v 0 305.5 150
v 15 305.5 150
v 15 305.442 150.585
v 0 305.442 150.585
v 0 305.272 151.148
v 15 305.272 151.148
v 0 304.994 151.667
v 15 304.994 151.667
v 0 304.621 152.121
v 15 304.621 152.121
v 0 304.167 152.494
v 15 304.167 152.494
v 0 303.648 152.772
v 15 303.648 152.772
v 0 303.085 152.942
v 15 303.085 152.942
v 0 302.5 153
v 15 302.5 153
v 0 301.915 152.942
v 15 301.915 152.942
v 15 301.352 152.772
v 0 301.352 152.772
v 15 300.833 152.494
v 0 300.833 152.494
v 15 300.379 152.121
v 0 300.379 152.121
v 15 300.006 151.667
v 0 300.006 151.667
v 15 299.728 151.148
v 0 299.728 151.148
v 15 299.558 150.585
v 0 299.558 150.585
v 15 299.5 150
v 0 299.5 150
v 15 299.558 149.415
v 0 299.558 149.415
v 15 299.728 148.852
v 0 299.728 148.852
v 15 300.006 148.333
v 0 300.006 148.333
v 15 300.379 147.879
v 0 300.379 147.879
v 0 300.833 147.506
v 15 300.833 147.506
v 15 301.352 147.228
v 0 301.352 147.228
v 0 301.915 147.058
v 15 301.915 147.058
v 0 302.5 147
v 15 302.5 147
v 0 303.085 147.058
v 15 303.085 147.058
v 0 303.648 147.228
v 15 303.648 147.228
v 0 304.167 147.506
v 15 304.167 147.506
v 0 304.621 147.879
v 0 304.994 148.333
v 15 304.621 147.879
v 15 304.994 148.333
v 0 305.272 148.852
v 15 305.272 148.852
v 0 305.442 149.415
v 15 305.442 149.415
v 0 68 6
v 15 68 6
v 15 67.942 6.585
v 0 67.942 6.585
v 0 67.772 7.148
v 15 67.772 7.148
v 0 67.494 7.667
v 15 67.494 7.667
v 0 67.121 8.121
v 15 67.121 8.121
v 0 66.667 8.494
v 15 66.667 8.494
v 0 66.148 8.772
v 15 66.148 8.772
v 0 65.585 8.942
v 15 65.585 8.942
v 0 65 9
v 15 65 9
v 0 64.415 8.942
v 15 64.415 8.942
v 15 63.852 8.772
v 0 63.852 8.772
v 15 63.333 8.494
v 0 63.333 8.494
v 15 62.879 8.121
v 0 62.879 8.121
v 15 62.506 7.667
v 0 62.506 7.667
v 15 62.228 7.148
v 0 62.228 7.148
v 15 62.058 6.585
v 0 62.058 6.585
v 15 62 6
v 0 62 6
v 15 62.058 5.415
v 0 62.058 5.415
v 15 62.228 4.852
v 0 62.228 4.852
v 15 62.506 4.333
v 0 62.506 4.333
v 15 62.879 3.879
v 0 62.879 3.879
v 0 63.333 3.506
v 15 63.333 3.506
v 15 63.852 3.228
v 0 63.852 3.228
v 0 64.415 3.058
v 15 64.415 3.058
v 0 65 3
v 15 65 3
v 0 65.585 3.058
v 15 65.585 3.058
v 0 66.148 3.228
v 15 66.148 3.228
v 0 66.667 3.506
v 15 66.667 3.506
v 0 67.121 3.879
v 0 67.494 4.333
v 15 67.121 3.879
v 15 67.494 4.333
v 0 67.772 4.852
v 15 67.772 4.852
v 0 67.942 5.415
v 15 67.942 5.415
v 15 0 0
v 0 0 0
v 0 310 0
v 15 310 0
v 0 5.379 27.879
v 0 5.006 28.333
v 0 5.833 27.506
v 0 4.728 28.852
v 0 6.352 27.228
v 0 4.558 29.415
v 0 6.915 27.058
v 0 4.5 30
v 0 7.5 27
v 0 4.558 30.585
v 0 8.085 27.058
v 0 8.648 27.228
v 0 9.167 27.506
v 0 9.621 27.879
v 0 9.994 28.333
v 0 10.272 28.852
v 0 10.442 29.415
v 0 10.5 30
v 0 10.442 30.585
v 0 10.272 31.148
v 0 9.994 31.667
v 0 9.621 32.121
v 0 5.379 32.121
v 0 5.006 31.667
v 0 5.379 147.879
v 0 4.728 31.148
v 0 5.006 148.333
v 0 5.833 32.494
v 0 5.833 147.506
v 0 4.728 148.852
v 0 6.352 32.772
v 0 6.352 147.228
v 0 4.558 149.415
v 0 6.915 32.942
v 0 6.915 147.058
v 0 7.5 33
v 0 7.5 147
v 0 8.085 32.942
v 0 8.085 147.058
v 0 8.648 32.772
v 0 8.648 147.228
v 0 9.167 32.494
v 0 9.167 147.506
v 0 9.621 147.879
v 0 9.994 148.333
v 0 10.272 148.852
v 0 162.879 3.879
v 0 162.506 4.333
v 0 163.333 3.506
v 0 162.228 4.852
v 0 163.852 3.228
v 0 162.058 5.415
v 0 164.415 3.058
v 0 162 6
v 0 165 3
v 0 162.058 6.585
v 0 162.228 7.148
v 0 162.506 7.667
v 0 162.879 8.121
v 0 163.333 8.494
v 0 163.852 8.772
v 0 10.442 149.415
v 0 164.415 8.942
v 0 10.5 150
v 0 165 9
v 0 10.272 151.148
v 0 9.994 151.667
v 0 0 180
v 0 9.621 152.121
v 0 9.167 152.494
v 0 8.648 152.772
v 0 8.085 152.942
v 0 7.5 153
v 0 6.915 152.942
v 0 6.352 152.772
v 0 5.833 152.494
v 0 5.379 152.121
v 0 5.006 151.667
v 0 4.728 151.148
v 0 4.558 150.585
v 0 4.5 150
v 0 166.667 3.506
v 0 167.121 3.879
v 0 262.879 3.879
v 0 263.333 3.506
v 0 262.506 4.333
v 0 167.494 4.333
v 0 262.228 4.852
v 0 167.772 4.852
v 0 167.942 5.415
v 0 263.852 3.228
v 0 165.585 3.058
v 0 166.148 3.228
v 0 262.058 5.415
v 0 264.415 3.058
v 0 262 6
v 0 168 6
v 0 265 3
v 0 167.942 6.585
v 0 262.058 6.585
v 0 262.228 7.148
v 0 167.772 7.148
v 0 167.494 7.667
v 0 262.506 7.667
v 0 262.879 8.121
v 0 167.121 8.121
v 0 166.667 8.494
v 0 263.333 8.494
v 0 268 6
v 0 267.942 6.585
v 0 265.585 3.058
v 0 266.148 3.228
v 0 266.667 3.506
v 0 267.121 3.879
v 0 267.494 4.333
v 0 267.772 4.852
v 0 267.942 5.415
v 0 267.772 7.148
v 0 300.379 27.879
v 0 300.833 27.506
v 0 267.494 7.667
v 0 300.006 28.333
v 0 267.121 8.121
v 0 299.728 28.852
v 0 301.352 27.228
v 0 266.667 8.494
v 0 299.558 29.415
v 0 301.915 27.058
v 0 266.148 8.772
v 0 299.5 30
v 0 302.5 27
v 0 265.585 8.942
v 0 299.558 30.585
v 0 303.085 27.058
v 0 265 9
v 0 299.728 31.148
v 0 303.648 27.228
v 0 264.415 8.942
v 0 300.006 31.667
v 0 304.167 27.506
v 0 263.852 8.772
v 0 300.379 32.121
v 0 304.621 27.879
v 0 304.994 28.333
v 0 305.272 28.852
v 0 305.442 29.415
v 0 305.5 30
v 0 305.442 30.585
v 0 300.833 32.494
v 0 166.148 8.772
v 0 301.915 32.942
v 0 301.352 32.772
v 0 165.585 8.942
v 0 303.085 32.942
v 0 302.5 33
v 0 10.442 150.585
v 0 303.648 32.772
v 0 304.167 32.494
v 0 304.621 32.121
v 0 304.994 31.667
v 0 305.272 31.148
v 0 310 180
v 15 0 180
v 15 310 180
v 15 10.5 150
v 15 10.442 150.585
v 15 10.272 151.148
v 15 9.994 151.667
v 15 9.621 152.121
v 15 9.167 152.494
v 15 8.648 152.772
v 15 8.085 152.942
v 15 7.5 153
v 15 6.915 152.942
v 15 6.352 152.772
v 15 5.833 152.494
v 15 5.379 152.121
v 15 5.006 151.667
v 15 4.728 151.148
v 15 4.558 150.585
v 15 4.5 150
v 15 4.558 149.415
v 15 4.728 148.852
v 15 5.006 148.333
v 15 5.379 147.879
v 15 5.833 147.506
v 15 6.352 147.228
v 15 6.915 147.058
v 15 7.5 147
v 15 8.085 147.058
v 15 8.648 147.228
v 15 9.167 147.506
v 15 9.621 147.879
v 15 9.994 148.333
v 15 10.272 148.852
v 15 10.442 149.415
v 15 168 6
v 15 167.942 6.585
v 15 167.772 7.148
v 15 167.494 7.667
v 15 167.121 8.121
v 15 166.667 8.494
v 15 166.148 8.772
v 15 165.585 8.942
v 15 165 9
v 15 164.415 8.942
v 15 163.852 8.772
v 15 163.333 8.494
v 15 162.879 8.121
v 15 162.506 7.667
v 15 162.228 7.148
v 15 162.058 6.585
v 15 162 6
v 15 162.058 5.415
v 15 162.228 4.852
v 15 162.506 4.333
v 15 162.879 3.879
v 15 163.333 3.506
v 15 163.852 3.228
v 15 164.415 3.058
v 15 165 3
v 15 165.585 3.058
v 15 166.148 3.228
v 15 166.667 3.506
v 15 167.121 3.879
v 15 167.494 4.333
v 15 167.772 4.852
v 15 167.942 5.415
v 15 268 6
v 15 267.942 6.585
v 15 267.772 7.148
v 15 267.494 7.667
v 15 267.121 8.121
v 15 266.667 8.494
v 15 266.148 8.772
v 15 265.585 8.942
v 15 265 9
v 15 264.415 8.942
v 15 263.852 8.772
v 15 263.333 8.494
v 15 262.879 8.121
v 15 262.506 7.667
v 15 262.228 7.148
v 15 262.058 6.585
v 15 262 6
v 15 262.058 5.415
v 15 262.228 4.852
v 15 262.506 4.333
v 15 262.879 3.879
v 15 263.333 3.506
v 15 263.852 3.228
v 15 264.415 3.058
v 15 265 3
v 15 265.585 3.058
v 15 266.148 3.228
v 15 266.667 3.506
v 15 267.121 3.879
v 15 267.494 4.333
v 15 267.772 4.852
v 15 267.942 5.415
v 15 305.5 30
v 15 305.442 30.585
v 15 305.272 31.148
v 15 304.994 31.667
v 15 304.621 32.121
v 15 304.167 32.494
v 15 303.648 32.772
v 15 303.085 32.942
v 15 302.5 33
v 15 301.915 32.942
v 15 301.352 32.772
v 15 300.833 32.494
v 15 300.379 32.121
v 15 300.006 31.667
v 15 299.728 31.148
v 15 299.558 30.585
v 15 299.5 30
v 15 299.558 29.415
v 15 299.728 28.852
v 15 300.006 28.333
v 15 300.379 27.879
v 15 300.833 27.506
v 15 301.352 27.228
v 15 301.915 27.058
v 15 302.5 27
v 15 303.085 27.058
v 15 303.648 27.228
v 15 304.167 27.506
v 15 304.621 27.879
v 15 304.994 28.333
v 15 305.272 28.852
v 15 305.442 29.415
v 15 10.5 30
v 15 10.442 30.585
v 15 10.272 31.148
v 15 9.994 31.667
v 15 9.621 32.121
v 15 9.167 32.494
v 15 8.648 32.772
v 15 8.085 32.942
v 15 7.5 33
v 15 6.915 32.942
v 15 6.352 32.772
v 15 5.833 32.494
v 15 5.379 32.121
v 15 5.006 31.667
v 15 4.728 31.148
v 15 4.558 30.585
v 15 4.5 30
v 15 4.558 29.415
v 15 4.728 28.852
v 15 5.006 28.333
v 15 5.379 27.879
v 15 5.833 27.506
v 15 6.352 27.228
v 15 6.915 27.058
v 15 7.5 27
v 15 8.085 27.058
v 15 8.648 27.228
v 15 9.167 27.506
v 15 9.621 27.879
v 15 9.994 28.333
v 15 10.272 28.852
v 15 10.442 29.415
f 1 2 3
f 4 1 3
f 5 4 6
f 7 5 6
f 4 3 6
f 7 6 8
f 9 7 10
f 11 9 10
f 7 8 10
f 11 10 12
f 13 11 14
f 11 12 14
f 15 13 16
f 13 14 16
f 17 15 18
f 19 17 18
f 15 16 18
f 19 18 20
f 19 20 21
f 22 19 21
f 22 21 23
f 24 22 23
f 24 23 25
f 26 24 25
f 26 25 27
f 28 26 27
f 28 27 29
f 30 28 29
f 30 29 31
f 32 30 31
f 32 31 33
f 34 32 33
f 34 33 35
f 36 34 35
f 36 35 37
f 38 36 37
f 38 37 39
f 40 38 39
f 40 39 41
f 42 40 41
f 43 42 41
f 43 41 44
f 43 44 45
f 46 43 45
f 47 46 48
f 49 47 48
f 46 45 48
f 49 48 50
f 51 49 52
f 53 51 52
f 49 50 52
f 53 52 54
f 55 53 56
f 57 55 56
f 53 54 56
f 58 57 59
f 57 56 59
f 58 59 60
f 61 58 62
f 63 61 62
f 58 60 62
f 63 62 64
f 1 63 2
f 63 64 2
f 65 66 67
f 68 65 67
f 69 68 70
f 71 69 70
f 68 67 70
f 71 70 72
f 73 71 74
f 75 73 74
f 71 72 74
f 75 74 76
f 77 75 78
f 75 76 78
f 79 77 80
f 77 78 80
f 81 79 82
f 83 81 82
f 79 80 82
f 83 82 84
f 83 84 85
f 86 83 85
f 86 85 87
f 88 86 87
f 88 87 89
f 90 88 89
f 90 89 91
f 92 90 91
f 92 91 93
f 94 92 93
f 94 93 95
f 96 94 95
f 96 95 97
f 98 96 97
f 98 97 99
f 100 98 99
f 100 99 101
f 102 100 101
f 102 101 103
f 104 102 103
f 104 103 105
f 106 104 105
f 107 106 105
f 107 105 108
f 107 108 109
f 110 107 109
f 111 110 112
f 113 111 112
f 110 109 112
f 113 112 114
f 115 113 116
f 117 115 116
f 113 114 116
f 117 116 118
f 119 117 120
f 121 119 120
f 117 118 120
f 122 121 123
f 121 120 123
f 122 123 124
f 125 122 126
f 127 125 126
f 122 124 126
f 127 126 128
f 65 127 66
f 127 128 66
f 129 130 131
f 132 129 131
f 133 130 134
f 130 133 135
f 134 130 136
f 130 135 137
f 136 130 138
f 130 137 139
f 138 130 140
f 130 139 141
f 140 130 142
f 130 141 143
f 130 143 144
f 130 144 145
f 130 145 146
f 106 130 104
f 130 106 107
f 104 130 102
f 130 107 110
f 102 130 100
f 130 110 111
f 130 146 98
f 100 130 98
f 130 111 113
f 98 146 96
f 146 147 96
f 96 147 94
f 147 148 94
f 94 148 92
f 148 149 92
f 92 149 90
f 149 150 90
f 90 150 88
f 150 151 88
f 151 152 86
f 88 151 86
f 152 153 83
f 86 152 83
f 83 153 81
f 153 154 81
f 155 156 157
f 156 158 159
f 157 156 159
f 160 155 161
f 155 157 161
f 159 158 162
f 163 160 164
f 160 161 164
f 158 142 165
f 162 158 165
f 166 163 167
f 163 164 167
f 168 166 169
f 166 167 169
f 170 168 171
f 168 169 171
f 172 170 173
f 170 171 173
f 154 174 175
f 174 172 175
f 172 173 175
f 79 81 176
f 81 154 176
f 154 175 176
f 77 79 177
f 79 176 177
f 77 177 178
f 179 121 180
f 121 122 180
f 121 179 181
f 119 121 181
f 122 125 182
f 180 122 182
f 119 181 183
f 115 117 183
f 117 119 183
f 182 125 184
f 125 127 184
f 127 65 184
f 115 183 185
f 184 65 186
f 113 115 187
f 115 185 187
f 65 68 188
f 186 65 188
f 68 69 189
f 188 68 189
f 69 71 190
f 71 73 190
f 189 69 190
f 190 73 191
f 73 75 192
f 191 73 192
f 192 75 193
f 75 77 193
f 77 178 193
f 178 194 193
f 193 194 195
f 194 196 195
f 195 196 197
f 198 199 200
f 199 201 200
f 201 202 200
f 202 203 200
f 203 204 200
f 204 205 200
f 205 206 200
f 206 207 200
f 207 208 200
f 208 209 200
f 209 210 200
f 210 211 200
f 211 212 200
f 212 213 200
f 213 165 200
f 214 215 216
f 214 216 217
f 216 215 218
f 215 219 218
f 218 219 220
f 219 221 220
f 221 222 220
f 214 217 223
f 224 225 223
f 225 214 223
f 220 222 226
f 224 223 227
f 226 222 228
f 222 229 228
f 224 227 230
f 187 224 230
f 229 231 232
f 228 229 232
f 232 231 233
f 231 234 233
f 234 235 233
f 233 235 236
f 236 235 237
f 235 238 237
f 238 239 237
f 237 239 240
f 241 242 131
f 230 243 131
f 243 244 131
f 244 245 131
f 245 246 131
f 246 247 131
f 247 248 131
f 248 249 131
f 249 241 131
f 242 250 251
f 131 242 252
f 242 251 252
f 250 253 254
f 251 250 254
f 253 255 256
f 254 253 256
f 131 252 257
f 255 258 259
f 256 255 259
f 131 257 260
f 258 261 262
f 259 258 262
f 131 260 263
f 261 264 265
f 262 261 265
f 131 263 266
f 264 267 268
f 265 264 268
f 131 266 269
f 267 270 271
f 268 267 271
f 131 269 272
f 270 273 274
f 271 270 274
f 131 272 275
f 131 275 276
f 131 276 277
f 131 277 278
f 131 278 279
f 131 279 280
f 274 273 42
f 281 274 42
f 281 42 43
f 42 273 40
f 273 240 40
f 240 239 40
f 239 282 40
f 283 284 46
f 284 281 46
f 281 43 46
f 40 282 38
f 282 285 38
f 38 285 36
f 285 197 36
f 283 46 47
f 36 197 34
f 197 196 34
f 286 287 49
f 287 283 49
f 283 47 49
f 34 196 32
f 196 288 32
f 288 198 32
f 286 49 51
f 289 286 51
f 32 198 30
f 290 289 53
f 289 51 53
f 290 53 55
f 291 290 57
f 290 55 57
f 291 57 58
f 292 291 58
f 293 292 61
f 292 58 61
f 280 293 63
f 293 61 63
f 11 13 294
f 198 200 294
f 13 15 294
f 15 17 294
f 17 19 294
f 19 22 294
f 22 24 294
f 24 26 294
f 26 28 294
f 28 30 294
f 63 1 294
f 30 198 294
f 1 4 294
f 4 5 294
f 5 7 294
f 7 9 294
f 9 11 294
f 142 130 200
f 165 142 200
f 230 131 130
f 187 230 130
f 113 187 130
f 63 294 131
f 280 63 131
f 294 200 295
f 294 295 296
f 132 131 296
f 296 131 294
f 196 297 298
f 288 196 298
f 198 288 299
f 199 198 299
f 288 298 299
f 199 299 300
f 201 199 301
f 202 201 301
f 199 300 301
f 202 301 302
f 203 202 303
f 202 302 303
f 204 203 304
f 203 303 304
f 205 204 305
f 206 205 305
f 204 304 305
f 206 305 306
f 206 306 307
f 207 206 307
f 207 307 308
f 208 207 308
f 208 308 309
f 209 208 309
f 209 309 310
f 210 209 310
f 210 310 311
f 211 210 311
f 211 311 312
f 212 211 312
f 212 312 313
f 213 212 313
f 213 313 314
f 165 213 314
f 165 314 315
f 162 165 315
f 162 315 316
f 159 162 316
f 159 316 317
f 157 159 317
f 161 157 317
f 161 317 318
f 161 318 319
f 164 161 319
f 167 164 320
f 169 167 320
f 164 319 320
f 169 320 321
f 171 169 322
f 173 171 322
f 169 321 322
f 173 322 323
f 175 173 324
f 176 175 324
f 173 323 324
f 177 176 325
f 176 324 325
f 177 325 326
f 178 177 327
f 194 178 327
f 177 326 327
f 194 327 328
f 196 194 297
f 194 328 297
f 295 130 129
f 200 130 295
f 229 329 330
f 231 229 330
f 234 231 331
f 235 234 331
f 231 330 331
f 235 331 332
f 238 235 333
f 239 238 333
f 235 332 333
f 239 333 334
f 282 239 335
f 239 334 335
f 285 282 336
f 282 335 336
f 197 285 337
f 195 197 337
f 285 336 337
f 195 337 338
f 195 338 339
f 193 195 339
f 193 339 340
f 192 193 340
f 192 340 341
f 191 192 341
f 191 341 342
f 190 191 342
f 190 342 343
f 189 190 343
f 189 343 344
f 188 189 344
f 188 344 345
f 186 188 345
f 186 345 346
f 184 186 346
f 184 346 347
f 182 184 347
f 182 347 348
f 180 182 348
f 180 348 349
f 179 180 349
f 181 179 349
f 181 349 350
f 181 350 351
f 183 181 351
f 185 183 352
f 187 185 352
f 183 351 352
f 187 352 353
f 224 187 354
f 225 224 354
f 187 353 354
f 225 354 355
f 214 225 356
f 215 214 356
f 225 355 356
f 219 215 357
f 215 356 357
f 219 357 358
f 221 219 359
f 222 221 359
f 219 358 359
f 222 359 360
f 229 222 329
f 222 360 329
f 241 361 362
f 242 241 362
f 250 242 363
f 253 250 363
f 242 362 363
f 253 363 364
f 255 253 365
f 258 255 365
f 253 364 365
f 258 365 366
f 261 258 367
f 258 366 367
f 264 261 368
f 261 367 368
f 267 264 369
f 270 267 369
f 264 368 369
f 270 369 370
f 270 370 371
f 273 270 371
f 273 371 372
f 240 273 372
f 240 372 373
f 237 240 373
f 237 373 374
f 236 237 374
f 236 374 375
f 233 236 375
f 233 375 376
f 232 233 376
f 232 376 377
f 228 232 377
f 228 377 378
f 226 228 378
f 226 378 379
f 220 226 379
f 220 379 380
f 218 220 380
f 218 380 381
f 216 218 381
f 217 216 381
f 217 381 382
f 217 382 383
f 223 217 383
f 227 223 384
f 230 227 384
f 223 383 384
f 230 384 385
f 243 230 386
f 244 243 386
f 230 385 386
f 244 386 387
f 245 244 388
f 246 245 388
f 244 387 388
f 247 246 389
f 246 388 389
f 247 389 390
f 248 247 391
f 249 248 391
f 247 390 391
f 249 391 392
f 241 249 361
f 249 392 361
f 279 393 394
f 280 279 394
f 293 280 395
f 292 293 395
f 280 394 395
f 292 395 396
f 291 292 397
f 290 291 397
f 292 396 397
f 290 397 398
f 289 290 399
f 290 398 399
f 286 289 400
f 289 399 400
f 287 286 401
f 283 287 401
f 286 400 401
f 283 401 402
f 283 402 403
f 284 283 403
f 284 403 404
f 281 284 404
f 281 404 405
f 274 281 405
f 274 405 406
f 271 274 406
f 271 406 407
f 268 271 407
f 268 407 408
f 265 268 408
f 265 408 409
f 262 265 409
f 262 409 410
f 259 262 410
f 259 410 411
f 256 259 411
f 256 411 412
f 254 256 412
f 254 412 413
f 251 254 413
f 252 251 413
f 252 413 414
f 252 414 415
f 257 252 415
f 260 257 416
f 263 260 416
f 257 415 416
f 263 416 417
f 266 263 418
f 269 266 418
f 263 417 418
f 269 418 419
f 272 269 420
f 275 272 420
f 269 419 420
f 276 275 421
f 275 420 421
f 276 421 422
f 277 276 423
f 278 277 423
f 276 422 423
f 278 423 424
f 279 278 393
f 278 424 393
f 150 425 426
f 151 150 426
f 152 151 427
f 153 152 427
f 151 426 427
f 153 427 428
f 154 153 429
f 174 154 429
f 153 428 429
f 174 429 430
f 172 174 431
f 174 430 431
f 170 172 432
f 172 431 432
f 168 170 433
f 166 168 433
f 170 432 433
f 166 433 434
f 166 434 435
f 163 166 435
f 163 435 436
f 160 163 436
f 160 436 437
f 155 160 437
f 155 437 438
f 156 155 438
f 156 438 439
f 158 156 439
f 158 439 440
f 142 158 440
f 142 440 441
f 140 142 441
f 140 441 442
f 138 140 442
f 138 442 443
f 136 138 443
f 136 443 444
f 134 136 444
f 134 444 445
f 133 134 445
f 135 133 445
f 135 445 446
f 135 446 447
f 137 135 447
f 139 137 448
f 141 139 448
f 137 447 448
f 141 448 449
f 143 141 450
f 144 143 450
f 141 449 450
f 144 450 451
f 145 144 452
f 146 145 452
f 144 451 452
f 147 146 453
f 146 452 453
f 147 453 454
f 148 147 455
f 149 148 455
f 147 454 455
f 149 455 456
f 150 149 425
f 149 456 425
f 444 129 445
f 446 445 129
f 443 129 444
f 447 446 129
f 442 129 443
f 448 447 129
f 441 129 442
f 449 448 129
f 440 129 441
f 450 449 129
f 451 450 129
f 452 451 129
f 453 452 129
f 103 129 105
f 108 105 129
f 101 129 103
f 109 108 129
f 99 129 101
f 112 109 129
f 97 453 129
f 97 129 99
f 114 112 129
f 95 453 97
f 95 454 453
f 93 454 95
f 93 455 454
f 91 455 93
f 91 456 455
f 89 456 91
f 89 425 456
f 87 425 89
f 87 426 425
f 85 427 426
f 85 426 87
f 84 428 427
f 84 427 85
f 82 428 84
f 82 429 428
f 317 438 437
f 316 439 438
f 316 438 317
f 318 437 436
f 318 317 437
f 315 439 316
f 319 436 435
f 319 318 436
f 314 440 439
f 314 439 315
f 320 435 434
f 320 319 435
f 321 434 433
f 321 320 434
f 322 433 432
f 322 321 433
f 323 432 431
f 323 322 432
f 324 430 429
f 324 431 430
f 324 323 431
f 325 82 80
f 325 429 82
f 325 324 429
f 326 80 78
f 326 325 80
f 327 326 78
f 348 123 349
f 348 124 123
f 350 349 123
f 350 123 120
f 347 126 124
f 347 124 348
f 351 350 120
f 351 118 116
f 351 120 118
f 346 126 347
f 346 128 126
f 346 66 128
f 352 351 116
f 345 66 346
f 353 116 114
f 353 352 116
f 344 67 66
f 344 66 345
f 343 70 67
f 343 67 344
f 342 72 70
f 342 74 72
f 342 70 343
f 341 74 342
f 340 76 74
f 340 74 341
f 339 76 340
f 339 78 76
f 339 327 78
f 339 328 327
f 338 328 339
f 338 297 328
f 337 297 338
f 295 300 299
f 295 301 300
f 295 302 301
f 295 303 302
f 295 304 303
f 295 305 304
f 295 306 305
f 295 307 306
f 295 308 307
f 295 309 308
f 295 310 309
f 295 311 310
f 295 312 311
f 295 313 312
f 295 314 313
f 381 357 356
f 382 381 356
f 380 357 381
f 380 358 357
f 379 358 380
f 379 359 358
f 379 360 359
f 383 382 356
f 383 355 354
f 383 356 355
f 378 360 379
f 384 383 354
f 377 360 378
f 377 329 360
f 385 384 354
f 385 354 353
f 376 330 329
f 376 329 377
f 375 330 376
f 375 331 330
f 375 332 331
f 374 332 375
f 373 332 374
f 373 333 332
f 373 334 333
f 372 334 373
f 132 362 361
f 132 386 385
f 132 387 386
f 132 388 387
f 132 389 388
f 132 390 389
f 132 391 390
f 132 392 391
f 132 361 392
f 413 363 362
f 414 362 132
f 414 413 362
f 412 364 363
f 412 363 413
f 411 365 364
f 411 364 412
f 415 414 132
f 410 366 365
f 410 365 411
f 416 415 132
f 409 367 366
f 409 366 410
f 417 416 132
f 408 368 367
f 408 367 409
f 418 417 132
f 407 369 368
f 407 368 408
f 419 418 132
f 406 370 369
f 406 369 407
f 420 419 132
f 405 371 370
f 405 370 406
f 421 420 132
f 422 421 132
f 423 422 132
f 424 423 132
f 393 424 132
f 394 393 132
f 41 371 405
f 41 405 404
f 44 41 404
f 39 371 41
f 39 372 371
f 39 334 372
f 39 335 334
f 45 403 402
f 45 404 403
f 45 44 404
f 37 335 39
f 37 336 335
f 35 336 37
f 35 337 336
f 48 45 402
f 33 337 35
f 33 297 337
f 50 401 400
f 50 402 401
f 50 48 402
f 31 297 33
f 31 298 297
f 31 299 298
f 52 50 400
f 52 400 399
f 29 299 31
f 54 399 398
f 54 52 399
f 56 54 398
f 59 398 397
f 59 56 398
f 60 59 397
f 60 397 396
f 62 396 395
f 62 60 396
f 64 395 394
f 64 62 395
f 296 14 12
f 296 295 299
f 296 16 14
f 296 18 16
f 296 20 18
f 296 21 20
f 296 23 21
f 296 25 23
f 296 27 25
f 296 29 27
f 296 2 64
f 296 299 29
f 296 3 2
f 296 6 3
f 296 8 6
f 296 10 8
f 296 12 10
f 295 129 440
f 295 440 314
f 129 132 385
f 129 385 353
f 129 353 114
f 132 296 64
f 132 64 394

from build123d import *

# Parameters (mm, degrees)
F0_W     = 310
F0_H     = 180
F1_DEPTH = 15
F2_R     = 3
F3_DEPTH = 15.001


with BuildPart() as f1:
    # F0 (on Right) → F1 (new body)
    with BuildSketch(Plane.YZ):
        with Locations((155, 90)):
            Rectangle(F0_W, F0_H)
    extrude(amount=F1_DEPTH)

    # F2 (on face) → F3 (cut, through all)
    with BuildSketch(Plane.YZ.offset(15)):
        with Locations((7.5, 30)):
            Circle(F2_R)
        with Locations((7.5, 150)):
            Circle(F2_R)
        with Locations((302.5, 150)):
            Circle(F2_R)
        with Locations((302.5, 30)):
            Circle(F2_R)
        with Locations((65, 6)):
            Circle(F2_R)
        with Locations((165, 6)):
            Circle(F2_R)
        with Locations((265, 6)):
            Circle(F2_R)
    extrude(amount=-F3_DEPTH, mode=Mode.SUBTRACT)


solid = f1.part
